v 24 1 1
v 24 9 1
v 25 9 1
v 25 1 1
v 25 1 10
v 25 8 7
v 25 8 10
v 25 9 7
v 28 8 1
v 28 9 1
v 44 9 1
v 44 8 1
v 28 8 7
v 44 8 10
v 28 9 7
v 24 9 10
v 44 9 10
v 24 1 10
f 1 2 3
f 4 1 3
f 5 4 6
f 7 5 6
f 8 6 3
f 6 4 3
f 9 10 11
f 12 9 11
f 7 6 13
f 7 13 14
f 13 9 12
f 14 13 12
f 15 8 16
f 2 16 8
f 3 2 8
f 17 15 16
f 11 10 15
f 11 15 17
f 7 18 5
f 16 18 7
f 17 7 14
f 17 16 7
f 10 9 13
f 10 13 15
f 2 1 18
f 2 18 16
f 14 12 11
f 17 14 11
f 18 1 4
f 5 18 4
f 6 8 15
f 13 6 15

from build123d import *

# Parameters (mm, degrees)
BOX008_W     = 1
BOX008_H     = 8
BOX008_DEPTH = 9
BOX009_W     = 16
BOX009_H     = 1
BOX009_DEPTH = 9
BOX010_W     = 3
BOX010_H     = 1
BOX010_DEPTH = 3


with BuildPart() as box008:
    # Box008 → Box008 (new body)
    with BuildSketch(Plane(origin=(24, 1, 1), x_dir=(1, 0, 0), z_dir=(0, 0, 1))):
        with Locations((0.5, 4)):
            Rectangle(BOX008_W, BOX008_H)
    extrude(amount=BOX008_DEPTH)


with BuildPart() as box009:
    # Box009 → Box009 (new body)
    with BuildSketch(Plane(origin=(28, 8, 1), x_dir=(1, 0, 0), z_dir=(0, 0, 1))):
        with Locations((8, 0.5)):
            Rectangle(BOX009_W, BOX009_H)
    extrude(amount=BOX009_DEPTH)


with BuildPart() as fusion005:
    # Box010 → Box010 (new body)
    with BuildSketch(Plane(origin=(25, 8, 7), x_dir=(1, 0, 0), z_dir=(0, 0, 1))):
        with Locations((1.5, 0.5)):
            Rectangle(BOX010_W, BOX010_H)
    extrude(amount=BOX010_DEPTH)

    # Fusion005: union Box008, Box009
    add(box008.part)
    add(box009.part)


solid = fusion005.part
